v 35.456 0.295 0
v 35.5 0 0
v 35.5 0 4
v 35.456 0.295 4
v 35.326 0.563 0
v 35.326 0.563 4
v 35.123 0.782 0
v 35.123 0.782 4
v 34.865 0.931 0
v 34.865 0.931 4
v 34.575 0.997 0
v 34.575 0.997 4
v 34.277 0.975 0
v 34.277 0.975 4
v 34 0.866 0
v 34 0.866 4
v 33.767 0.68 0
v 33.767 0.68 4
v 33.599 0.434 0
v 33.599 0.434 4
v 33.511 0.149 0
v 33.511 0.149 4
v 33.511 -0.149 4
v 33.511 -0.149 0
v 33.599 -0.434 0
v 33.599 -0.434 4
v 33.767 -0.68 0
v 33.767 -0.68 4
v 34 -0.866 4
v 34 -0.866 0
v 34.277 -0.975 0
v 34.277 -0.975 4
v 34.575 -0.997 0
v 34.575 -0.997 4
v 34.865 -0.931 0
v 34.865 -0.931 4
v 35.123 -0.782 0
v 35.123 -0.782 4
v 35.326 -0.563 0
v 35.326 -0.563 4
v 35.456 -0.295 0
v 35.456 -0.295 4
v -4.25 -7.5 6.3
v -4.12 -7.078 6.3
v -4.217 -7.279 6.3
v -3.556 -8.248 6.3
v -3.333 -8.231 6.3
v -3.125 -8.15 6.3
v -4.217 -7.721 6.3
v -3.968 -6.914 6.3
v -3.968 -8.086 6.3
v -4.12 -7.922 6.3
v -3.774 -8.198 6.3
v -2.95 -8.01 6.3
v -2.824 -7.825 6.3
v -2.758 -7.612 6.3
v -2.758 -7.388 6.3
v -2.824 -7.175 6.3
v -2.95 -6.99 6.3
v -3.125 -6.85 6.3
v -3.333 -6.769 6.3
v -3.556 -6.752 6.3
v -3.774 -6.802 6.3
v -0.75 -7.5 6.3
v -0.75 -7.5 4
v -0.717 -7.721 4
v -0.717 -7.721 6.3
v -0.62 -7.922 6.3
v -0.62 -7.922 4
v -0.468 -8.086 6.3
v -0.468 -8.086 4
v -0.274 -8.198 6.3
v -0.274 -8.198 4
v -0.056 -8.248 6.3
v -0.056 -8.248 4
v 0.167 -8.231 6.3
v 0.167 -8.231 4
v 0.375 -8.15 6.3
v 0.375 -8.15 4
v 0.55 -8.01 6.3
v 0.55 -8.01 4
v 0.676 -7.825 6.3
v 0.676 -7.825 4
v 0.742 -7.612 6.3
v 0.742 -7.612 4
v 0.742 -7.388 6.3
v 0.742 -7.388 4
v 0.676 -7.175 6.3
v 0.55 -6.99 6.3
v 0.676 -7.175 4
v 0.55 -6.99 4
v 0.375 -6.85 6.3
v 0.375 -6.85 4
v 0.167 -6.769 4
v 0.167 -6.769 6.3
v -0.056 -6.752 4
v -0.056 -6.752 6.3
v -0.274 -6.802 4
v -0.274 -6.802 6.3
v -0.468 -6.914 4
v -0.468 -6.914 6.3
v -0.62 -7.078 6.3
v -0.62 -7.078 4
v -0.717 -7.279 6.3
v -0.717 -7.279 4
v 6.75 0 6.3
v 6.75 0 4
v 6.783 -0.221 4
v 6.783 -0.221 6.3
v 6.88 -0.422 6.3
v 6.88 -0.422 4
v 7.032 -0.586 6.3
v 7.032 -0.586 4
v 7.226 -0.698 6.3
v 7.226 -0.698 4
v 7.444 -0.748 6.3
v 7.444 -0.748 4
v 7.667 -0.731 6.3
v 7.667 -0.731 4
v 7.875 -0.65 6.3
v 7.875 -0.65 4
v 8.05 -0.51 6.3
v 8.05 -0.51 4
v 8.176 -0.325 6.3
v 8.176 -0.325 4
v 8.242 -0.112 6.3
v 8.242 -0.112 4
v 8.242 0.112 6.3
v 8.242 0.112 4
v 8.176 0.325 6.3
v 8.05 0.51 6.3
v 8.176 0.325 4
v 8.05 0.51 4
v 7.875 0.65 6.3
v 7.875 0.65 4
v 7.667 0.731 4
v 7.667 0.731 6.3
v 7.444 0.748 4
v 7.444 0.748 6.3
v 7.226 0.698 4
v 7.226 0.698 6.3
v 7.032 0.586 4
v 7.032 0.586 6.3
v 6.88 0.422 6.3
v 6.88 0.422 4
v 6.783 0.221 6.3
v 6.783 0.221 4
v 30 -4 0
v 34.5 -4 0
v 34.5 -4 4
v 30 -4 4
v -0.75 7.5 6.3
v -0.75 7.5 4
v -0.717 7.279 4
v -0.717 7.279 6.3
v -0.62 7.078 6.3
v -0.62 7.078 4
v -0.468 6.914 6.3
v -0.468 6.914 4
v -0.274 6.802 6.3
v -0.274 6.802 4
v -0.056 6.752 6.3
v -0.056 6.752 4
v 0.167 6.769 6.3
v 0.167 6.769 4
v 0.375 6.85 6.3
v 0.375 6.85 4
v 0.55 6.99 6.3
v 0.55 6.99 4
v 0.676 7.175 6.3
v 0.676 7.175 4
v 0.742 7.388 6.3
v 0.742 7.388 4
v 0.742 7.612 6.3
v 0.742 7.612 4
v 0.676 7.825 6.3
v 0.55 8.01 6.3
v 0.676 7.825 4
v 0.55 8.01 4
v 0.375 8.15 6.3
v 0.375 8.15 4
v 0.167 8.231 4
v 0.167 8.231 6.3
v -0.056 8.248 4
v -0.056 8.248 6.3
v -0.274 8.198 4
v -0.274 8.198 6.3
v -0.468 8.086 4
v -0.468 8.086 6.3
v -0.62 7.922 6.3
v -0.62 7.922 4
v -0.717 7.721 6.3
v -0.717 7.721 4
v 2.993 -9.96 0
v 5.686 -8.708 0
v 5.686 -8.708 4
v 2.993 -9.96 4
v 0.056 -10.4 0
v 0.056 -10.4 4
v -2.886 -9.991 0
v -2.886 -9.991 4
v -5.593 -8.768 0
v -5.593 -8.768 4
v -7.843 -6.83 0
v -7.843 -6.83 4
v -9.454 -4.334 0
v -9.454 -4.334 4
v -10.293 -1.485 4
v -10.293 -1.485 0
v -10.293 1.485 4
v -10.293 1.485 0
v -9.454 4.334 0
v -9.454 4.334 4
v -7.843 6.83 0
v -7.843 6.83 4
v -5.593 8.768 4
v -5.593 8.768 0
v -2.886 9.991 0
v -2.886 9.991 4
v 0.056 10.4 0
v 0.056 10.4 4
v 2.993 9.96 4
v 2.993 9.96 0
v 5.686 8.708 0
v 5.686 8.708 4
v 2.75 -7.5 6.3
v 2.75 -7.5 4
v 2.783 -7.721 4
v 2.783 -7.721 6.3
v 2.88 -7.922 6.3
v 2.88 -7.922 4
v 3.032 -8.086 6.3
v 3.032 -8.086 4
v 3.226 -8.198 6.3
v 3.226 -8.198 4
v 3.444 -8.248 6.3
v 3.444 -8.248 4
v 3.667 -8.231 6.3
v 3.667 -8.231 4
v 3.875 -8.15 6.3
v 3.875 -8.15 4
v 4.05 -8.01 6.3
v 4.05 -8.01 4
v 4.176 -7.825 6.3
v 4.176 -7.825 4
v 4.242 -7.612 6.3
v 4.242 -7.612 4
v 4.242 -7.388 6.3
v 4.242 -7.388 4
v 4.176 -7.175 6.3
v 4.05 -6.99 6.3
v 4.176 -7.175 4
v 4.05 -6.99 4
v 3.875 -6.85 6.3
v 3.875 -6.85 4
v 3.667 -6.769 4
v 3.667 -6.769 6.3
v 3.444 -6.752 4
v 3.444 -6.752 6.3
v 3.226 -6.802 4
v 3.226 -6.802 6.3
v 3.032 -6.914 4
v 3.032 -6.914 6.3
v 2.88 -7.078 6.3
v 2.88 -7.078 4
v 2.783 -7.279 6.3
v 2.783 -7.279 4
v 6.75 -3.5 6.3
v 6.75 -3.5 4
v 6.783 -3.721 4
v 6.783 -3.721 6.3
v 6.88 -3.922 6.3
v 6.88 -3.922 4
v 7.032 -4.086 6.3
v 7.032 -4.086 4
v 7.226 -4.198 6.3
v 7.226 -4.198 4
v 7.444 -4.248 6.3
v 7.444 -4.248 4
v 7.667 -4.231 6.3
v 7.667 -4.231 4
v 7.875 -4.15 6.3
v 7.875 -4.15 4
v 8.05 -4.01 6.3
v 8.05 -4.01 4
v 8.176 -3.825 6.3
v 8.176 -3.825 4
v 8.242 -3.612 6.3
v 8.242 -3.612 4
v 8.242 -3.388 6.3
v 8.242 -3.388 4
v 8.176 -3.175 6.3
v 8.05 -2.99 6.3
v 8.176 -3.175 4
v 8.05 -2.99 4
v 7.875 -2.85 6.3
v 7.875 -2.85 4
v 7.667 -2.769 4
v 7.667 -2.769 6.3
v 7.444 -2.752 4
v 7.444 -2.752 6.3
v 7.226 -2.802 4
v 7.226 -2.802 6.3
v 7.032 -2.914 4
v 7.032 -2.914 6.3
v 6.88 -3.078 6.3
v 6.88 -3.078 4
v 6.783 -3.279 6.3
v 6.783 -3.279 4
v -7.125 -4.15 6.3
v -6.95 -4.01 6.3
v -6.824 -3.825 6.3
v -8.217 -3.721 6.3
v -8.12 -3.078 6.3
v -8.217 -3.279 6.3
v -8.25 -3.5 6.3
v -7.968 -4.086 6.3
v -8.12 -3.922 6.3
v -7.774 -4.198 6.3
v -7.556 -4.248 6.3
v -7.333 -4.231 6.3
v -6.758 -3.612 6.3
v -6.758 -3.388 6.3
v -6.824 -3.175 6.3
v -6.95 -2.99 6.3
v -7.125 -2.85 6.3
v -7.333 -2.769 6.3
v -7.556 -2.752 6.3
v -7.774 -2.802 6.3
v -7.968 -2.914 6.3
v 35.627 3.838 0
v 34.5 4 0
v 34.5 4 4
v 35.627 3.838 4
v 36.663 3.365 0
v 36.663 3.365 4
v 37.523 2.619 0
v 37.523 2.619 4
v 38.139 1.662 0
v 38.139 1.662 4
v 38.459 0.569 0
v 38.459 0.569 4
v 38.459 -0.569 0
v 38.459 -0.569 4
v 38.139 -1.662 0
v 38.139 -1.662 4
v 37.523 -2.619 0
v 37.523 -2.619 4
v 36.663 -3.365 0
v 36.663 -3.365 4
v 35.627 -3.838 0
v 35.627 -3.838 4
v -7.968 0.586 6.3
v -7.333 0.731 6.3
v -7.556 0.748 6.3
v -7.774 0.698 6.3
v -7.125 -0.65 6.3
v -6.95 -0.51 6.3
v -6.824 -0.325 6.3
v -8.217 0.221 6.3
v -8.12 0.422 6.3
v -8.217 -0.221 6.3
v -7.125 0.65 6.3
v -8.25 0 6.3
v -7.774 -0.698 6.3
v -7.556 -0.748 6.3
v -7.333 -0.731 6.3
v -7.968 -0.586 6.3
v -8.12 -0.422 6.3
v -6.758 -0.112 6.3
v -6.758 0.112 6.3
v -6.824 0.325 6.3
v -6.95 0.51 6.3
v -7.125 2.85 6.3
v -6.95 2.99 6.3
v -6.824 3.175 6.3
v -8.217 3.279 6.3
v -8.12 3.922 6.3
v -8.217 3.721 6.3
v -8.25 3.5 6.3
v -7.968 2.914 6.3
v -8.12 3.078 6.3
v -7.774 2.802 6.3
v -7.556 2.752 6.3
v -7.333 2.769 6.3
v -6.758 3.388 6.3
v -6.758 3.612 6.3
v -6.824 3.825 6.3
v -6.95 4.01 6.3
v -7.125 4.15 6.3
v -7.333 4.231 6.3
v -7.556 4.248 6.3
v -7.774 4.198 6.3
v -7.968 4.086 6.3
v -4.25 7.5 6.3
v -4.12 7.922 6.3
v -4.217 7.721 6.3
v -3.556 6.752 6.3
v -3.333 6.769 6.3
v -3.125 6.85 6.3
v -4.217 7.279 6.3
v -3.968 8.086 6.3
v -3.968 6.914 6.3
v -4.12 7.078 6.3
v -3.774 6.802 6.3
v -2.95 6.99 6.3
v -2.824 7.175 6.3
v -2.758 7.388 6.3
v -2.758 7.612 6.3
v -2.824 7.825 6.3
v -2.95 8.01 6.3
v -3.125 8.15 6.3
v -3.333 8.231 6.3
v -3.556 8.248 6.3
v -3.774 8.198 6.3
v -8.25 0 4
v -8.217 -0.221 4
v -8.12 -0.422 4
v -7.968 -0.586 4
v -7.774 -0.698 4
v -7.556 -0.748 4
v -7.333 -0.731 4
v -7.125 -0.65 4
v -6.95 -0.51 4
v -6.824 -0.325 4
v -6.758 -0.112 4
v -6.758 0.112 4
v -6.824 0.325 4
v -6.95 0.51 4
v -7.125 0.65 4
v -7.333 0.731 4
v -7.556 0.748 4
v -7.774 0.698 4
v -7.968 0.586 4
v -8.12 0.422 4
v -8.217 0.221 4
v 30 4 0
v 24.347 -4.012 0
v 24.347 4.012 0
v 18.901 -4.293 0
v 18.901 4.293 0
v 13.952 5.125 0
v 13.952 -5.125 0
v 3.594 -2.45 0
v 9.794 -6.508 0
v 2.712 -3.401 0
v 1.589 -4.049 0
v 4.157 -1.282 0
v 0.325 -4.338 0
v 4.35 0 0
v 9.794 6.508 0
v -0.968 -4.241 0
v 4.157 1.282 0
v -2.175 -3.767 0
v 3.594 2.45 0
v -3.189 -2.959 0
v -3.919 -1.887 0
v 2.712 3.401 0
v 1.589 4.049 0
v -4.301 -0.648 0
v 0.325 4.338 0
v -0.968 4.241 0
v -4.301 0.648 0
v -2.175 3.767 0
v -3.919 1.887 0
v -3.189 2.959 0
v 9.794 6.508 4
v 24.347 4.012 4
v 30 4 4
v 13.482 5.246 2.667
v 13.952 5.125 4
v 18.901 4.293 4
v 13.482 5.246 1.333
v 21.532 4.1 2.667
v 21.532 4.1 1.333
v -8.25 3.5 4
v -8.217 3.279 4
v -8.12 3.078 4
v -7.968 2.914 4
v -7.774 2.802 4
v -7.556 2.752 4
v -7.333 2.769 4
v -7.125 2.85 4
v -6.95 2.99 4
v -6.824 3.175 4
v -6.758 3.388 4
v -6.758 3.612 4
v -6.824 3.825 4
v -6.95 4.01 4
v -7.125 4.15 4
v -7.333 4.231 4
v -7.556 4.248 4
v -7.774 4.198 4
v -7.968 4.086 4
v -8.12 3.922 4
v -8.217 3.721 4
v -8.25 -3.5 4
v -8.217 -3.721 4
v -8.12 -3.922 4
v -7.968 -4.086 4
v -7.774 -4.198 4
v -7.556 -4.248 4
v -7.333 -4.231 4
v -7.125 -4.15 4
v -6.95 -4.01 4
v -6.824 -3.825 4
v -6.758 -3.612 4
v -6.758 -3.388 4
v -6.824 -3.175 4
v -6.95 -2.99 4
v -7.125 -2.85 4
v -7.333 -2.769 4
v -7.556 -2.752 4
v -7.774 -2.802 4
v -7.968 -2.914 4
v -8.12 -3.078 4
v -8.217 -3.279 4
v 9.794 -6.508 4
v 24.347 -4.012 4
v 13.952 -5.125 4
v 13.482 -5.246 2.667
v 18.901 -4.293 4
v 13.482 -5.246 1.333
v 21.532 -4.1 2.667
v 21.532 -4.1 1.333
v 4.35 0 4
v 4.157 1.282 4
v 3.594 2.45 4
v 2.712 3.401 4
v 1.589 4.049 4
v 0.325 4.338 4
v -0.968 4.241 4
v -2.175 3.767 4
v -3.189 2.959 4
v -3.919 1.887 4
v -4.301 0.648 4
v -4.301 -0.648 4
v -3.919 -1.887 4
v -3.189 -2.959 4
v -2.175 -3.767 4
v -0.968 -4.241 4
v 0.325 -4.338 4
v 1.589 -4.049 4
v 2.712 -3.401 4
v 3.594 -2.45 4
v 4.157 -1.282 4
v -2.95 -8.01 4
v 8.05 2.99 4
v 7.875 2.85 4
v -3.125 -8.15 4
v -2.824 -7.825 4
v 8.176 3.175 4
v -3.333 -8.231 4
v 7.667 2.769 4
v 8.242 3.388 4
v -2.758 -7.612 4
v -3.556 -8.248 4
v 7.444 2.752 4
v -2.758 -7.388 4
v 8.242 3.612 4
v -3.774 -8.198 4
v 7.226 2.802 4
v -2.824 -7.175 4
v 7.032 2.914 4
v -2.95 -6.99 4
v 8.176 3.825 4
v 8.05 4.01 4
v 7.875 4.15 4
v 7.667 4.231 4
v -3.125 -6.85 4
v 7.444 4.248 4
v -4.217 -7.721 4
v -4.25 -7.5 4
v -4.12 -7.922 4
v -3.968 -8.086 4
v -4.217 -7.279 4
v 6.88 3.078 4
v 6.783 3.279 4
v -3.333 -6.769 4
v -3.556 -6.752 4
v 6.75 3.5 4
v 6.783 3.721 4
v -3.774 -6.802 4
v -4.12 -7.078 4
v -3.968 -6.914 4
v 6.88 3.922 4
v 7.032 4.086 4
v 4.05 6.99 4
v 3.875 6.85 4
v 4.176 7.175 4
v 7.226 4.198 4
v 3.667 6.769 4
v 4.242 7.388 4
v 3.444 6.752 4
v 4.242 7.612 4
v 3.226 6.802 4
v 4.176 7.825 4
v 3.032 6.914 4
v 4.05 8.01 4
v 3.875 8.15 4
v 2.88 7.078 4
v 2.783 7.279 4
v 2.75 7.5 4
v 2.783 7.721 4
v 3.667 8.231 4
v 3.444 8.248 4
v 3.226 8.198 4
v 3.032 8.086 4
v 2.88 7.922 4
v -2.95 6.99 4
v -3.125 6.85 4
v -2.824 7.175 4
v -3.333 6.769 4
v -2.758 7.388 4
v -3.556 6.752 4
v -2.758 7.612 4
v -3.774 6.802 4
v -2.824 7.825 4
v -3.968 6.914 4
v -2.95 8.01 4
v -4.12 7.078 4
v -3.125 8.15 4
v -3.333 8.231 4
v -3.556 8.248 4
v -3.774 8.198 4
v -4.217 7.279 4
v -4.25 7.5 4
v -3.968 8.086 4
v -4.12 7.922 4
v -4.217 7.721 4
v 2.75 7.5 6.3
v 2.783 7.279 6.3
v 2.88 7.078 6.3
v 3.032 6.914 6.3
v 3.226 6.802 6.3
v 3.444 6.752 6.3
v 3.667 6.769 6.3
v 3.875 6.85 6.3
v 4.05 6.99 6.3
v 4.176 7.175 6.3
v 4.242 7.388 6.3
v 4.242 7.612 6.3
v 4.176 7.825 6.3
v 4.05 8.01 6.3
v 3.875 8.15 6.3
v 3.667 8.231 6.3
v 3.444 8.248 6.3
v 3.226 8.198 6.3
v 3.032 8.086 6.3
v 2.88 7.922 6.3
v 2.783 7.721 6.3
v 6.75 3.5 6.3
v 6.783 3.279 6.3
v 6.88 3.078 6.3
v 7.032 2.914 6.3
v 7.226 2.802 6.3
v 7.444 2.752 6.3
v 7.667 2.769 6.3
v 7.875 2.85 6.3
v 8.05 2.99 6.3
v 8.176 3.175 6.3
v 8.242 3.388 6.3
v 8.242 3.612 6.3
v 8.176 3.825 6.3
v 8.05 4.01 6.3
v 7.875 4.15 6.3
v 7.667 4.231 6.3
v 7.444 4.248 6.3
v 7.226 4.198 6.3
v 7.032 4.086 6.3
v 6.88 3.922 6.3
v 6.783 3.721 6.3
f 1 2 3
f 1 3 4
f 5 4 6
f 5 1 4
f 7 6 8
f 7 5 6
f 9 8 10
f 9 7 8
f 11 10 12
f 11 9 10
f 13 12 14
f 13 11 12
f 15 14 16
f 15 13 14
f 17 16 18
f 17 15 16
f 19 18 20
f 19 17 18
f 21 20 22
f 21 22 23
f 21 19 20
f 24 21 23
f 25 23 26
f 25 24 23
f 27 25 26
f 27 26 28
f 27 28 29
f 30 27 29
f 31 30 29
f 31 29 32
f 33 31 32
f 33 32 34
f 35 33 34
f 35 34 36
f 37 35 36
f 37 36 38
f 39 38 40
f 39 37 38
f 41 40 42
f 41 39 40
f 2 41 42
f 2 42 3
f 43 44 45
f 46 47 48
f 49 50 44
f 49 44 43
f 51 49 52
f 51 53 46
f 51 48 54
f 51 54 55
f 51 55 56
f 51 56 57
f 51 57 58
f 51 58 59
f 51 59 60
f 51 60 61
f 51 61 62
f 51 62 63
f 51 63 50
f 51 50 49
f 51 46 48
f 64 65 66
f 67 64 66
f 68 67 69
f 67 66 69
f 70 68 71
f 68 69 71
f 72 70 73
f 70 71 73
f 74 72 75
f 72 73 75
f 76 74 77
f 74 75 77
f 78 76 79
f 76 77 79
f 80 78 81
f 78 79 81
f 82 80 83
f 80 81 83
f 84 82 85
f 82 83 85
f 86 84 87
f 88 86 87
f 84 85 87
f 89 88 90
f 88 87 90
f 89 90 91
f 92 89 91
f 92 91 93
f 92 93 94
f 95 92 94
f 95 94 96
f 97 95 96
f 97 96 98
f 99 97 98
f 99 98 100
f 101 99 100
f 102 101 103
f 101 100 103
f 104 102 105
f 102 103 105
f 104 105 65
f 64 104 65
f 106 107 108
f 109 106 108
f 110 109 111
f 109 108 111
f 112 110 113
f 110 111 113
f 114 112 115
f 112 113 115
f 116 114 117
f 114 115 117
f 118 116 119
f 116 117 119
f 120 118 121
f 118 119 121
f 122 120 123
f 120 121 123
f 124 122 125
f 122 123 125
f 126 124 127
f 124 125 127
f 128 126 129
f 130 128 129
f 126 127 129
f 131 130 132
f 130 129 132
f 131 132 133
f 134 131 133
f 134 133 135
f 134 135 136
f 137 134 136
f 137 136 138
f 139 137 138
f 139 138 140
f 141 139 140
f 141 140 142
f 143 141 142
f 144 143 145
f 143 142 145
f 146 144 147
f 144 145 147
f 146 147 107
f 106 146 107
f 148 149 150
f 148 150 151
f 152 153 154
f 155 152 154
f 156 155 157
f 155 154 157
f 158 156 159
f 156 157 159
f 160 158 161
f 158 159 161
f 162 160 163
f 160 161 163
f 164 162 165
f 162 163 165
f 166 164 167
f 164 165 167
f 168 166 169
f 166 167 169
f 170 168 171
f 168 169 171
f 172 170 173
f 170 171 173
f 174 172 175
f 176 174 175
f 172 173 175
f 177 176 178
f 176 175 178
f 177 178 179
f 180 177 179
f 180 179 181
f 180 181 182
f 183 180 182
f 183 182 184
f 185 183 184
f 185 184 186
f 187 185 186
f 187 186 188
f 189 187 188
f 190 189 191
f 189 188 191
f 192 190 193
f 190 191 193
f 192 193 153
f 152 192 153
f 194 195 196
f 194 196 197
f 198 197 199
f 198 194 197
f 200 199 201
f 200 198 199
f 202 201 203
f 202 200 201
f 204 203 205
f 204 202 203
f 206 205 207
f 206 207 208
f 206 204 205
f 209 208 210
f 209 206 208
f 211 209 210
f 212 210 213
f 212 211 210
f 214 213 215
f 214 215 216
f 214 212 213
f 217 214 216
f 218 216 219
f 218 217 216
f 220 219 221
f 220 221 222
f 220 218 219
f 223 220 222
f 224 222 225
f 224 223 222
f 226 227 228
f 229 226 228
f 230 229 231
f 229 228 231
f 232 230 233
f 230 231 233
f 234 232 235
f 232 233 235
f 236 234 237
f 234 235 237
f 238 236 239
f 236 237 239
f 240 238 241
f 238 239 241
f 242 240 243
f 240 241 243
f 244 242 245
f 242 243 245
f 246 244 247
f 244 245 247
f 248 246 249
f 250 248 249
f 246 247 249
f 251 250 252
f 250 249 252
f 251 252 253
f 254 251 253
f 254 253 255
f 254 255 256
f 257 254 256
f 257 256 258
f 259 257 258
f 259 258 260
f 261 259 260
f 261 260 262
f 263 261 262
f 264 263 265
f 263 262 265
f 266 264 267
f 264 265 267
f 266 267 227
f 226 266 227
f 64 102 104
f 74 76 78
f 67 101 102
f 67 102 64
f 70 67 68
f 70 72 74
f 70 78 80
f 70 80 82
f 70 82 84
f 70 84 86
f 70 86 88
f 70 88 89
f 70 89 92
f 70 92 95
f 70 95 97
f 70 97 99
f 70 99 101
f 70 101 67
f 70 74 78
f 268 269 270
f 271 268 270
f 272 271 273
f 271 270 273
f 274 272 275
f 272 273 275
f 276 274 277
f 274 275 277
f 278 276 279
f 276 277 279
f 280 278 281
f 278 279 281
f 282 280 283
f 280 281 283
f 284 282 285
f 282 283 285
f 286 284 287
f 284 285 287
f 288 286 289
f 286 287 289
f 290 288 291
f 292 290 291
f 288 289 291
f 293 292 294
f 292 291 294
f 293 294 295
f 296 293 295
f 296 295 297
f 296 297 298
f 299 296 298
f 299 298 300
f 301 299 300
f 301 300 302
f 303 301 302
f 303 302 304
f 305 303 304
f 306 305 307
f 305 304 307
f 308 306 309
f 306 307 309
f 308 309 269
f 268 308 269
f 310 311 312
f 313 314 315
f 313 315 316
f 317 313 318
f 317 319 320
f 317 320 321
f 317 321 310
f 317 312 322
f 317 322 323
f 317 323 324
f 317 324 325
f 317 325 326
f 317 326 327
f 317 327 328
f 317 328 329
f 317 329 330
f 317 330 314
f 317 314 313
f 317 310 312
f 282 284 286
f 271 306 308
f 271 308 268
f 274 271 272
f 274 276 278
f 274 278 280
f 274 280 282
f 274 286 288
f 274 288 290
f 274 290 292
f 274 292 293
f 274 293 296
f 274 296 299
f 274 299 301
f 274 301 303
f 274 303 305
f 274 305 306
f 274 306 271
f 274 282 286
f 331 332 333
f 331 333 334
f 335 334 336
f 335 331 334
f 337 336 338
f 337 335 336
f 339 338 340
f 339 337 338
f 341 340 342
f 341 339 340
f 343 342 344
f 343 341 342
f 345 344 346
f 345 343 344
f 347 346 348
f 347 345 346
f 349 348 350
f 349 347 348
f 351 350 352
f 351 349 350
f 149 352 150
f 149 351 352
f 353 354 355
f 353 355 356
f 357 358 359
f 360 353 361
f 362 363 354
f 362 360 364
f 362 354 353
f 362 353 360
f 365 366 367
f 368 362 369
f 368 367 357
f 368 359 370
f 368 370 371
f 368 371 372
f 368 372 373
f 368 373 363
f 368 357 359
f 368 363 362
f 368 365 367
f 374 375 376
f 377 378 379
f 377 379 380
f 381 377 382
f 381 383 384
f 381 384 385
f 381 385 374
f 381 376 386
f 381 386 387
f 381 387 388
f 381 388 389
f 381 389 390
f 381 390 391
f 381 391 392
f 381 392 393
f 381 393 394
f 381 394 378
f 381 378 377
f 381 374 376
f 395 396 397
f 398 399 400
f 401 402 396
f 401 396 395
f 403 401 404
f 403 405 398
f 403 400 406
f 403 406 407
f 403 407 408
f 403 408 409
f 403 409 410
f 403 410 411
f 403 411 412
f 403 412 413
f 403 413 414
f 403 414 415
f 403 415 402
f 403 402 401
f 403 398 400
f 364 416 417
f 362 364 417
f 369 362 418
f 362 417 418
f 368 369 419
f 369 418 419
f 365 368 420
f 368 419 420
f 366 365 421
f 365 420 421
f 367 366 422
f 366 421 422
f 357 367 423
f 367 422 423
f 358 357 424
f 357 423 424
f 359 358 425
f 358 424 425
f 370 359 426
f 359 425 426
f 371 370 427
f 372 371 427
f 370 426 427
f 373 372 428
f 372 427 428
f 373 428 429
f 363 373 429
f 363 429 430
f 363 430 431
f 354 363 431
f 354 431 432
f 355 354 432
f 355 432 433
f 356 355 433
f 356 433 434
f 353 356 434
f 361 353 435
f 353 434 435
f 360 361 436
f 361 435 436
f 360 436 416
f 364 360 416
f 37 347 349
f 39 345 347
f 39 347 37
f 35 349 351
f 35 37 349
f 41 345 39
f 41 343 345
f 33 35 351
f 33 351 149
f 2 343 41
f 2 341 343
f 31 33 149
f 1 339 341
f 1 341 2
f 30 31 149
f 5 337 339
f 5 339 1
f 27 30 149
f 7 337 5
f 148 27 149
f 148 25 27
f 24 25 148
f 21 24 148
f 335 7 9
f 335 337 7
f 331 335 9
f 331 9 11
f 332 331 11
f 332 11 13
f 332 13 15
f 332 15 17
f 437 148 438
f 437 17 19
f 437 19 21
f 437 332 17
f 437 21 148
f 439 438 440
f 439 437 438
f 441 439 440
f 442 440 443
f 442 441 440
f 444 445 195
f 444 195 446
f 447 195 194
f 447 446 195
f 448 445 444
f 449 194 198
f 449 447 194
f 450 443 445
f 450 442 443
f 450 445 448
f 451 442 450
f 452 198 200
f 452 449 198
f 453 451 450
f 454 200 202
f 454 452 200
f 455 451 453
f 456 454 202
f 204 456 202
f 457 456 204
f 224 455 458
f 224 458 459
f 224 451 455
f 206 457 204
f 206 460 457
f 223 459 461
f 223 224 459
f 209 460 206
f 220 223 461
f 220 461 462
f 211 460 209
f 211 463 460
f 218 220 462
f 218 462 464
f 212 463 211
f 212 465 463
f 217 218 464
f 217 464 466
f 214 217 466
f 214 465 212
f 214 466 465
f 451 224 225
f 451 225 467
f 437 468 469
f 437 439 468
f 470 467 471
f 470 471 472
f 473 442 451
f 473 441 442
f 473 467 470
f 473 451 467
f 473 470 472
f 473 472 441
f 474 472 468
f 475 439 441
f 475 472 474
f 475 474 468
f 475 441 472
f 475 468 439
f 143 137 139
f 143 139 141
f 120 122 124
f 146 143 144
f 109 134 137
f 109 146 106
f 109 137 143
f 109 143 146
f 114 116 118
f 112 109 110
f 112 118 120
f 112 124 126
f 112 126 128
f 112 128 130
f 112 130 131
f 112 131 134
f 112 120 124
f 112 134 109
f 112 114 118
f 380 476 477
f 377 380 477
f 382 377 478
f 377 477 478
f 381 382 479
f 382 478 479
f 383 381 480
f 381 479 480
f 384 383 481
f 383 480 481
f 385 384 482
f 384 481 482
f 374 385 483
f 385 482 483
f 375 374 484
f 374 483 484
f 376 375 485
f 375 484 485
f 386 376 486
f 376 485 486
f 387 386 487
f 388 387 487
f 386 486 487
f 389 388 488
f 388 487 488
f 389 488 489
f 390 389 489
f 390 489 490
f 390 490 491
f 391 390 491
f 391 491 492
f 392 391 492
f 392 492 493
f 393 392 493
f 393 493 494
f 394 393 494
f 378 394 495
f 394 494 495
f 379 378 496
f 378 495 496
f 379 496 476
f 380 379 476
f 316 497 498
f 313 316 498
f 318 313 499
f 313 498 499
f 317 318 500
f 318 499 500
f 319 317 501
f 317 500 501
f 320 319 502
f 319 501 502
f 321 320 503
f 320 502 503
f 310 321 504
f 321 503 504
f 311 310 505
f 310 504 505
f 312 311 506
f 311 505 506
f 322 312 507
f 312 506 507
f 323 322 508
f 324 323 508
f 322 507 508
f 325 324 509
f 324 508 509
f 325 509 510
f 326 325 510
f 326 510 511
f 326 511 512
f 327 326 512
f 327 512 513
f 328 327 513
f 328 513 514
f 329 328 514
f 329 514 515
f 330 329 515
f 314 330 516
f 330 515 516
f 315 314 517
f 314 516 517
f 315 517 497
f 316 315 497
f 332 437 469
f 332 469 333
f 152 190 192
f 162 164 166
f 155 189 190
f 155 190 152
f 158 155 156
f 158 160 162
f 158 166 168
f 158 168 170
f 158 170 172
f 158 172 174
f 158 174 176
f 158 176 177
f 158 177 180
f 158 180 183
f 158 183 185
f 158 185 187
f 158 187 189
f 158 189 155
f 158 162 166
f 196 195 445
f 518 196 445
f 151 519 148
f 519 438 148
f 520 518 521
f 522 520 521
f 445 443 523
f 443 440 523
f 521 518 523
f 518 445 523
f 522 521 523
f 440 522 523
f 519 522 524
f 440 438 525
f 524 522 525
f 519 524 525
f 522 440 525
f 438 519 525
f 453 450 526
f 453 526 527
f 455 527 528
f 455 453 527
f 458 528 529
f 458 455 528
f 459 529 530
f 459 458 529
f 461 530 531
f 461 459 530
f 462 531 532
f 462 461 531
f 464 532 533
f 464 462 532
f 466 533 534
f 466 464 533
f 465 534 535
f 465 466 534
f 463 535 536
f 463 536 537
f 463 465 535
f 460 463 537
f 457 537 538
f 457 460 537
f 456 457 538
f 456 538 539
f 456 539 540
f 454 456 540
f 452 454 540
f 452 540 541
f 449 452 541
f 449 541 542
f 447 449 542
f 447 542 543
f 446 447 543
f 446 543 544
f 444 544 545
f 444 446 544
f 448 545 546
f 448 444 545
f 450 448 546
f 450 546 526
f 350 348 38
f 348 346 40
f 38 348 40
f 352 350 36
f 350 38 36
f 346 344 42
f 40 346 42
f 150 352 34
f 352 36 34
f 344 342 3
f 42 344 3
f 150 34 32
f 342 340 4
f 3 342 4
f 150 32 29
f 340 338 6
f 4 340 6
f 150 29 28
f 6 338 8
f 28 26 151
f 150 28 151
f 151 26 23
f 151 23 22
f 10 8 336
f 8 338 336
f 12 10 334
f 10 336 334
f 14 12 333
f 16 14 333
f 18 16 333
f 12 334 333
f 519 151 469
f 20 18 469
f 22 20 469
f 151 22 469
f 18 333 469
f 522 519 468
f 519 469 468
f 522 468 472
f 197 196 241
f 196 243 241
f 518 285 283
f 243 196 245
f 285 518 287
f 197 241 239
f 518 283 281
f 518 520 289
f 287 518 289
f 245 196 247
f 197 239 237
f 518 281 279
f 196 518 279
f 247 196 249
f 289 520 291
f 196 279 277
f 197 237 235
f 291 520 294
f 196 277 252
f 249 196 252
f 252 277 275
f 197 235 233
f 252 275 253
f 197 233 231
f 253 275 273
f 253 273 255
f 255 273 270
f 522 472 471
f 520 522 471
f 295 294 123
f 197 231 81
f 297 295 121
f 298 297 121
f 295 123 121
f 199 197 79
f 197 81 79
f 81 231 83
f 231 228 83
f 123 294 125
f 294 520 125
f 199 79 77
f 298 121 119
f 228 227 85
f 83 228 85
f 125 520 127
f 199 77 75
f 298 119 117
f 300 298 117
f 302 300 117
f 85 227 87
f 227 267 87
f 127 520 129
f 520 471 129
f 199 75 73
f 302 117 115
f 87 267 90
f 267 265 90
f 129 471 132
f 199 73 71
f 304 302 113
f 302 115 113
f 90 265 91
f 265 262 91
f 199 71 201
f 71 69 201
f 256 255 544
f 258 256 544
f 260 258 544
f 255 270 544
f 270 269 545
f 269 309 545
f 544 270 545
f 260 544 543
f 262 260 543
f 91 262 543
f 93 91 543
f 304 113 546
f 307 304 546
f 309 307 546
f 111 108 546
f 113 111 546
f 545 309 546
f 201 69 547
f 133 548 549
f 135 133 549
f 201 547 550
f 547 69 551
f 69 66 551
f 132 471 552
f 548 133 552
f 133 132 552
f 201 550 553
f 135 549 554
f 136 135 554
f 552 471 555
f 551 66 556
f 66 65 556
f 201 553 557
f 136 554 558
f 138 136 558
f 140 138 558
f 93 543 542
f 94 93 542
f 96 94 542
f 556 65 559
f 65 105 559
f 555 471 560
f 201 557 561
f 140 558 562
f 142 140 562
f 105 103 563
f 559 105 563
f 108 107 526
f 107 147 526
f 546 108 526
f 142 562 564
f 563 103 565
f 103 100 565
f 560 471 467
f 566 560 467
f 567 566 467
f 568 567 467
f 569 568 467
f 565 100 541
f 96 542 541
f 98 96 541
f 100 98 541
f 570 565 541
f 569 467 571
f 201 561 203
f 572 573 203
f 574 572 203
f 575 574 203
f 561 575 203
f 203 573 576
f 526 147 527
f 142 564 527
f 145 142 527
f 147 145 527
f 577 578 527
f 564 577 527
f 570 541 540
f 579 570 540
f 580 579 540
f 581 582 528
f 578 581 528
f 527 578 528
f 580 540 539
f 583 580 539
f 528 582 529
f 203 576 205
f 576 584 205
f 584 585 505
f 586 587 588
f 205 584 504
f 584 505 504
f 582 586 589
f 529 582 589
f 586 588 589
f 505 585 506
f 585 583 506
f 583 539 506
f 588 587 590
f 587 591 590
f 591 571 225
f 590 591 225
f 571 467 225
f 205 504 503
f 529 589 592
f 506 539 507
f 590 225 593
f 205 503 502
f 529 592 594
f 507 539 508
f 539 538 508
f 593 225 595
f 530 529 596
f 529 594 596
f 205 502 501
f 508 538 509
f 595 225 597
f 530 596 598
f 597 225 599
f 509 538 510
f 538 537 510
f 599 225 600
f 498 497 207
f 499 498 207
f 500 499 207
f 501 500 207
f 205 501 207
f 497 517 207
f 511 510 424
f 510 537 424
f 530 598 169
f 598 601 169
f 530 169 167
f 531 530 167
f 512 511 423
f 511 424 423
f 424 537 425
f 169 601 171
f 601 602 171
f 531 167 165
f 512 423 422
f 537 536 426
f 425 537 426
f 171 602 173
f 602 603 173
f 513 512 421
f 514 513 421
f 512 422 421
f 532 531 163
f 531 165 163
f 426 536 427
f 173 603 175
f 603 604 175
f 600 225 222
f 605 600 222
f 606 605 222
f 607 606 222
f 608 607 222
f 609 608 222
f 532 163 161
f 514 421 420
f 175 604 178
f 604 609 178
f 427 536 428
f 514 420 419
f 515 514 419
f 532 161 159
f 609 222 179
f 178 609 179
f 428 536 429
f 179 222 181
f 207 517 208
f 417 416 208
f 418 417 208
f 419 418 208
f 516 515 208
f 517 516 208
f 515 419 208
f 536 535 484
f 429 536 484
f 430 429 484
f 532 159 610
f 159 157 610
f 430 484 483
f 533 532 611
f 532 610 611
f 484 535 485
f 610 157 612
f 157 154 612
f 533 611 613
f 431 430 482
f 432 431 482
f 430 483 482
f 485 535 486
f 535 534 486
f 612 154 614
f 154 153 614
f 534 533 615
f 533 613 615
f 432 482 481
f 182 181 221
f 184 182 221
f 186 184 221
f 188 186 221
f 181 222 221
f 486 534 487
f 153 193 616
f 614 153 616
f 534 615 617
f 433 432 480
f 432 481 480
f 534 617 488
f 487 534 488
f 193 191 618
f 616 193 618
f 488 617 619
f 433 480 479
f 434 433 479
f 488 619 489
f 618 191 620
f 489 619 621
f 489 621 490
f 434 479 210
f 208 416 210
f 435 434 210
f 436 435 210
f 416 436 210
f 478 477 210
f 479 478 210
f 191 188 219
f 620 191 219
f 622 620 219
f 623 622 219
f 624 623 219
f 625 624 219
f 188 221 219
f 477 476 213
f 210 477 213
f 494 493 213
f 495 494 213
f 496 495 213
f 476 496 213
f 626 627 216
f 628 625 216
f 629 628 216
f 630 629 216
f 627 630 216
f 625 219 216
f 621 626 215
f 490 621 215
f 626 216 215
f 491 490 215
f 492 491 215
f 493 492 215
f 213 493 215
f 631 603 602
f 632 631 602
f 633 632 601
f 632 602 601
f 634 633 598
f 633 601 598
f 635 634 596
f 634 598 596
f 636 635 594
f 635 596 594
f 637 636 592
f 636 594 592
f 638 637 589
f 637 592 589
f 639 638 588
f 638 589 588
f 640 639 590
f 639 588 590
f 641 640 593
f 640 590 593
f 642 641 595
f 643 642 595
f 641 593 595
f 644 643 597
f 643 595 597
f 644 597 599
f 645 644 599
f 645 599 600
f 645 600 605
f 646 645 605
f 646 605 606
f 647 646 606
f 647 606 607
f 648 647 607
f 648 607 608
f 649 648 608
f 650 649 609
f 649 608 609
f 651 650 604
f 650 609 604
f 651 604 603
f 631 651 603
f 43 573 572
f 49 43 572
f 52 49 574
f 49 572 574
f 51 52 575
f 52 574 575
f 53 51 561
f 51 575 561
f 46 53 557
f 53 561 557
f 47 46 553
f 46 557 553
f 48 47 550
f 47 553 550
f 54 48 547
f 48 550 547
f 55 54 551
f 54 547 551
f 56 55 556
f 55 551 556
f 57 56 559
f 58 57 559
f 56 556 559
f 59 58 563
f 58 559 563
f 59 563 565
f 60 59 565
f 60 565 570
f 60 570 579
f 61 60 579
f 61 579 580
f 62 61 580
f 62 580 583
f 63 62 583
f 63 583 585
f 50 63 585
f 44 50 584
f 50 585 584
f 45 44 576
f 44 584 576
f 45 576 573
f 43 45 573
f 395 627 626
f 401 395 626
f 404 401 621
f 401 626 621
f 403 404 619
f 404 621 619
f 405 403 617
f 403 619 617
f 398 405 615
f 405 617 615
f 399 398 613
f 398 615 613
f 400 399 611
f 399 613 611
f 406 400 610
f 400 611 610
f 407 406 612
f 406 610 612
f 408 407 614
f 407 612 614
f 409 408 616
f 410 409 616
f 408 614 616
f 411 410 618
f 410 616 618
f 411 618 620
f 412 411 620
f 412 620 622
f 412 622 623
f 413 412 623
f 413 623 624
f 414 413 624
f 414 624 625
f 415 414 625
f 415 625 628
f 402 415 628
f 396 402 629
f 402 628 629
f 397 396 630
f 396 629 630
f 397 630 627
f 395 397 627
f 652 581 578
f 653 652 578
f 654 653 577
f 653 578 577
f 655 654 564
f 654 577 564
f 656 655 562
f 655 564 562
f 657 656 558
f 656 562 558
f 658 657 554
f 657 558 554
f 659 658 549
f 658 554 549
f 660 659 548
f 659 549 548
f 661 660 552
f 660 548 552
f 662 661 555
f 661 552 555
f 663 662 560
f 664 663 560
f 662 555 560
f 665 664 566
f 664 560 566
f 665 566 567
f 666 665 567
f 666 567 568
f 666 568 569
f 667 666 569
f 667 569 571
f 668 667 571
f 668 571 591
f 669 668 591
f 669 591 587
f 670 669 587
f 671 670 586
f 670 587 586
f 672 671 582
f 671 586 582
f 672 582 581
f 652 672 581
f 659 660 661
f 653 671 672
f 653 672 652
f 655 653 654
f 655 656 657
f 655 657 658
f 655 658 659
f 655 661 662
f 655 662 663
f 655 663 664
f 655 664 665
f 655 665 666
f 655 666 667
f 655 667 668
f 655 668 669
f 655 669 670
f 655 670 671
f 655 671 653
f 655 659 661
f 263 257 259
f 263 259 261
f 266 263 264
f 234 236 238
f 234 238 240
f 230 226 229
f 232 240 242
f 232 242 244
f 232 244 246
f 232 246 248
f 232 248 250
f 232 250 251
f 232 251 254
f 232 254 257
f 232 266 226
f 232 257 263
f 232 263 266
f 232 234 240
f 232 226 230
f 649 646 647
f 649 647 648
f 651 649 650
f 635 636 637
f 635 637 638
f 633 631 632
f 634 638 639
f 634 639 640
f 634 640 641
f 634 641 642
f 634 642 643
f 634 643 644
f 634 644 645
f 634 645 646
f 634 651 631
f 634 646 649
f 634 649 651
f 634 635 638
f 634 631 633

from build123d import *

# Parameters (mm, degrees)
SKETCH1_R           = 4.35
SKETCH1_R_2         = 1
BOSS_EXTRUDE1_DEPTH = 4
SKETCH2_R           = 0.75
BOSS_EXTRUDE2_DEPTH = 2.3


with BuildPart() as part:
    # Sketch1 → Boss-Extrude1 (new body)
    with BuildSketch(Plane.XY):
        with BuildLine():
            Line((30, 4), (34.5, 4))
            ThreePointArc((34.5, 4), (38.5, 0), (34.5, -4))
            Line((34.5, -4), (30, -4))
            add(Edge.make_bspline(
                [(5.686193022, -8.707882), (13.410427979, -3.664004406), (21.266865382, -4), (30, -4)],
                knots=[0, 0, 0, 0, 1, 1, 1, 1], degree=3))
            ThreePointArc((5.686193022, -8.707882), (-10.4, 0), (5.686193022, 8.707882))
            add(Edge.make_bspline(
                [(5.686193022, 8.707882), (13.410427979, 3.664004406), (21.266865382, 4), (30, 4)],
                knots=[0, 0, 0, 0, 1, 1, 1, 1], degree=3))
        make_face()
        Circle(SKETCH1_R, mode=Mode.SUBTRACT)
        with Locations((34.5, 0)):
            Circle(SKETCH1_R_2, mode=Mode.SUBTRACT)
    extrude(amount=BOSS_EXTRUDE1_DEPTH)

    # Sketch2 → Boss-Extrude2 (add)
    with BuildSketch(Plane.XY.offset(4)):
        with Locations(Location((0, 7.5, 0), (0, 0, 180))):
            Circle(SKETCH2_R)
        with Locations(Location((3.5, 7.5, 0), (0, 0, 180))):
            Circle(SKETCH2_R)
        with Locations(Location((-3.5, 7.5, 0), (0, 0, 180))):
            Circle(SKETCH2_R)
        with Locations(Location((3.5, -7.5, 0), (0, 0, 180))):
            Circle(SKETCH2_R)
        with Locations(Location((0, -7.5, 0), (0, 0, 180))):
            Circle(SKETCH2_R)
        with Locations(Location((-3.5, -7.5, 0), (0, 0, 180))):
            Circle(SKETCH2_R)
        with Locations(Location((7.5, 0, 0), (0, 0, 180))):
            Circle(SKETCH2_R)
        with Locations(Location((7.5, 3.5, 0), (0, 0, 180))):
            Circle(SKETCH2_R)
        with Locations(Location((7.5, -3.5, 0), (0, 0, 180))):
            Circle(SKETCH2_R)
        with Locations(Location((-7.5, -3.5, 0), (0, 0, 180))):
            Circle(SKETCH2_R)
        with Locations(Location((-7.5, 0, 0), (0, 0, 180))):
            Circle(SKETCH2_R)
        with Locations(Location((-7.5, 3.5, 0), (0, 0, 180))):
            Circle(SKETCH2_R)
    extrude(amount=BOSS_EXTRUDE2_DEPTH)


solid = part.part
